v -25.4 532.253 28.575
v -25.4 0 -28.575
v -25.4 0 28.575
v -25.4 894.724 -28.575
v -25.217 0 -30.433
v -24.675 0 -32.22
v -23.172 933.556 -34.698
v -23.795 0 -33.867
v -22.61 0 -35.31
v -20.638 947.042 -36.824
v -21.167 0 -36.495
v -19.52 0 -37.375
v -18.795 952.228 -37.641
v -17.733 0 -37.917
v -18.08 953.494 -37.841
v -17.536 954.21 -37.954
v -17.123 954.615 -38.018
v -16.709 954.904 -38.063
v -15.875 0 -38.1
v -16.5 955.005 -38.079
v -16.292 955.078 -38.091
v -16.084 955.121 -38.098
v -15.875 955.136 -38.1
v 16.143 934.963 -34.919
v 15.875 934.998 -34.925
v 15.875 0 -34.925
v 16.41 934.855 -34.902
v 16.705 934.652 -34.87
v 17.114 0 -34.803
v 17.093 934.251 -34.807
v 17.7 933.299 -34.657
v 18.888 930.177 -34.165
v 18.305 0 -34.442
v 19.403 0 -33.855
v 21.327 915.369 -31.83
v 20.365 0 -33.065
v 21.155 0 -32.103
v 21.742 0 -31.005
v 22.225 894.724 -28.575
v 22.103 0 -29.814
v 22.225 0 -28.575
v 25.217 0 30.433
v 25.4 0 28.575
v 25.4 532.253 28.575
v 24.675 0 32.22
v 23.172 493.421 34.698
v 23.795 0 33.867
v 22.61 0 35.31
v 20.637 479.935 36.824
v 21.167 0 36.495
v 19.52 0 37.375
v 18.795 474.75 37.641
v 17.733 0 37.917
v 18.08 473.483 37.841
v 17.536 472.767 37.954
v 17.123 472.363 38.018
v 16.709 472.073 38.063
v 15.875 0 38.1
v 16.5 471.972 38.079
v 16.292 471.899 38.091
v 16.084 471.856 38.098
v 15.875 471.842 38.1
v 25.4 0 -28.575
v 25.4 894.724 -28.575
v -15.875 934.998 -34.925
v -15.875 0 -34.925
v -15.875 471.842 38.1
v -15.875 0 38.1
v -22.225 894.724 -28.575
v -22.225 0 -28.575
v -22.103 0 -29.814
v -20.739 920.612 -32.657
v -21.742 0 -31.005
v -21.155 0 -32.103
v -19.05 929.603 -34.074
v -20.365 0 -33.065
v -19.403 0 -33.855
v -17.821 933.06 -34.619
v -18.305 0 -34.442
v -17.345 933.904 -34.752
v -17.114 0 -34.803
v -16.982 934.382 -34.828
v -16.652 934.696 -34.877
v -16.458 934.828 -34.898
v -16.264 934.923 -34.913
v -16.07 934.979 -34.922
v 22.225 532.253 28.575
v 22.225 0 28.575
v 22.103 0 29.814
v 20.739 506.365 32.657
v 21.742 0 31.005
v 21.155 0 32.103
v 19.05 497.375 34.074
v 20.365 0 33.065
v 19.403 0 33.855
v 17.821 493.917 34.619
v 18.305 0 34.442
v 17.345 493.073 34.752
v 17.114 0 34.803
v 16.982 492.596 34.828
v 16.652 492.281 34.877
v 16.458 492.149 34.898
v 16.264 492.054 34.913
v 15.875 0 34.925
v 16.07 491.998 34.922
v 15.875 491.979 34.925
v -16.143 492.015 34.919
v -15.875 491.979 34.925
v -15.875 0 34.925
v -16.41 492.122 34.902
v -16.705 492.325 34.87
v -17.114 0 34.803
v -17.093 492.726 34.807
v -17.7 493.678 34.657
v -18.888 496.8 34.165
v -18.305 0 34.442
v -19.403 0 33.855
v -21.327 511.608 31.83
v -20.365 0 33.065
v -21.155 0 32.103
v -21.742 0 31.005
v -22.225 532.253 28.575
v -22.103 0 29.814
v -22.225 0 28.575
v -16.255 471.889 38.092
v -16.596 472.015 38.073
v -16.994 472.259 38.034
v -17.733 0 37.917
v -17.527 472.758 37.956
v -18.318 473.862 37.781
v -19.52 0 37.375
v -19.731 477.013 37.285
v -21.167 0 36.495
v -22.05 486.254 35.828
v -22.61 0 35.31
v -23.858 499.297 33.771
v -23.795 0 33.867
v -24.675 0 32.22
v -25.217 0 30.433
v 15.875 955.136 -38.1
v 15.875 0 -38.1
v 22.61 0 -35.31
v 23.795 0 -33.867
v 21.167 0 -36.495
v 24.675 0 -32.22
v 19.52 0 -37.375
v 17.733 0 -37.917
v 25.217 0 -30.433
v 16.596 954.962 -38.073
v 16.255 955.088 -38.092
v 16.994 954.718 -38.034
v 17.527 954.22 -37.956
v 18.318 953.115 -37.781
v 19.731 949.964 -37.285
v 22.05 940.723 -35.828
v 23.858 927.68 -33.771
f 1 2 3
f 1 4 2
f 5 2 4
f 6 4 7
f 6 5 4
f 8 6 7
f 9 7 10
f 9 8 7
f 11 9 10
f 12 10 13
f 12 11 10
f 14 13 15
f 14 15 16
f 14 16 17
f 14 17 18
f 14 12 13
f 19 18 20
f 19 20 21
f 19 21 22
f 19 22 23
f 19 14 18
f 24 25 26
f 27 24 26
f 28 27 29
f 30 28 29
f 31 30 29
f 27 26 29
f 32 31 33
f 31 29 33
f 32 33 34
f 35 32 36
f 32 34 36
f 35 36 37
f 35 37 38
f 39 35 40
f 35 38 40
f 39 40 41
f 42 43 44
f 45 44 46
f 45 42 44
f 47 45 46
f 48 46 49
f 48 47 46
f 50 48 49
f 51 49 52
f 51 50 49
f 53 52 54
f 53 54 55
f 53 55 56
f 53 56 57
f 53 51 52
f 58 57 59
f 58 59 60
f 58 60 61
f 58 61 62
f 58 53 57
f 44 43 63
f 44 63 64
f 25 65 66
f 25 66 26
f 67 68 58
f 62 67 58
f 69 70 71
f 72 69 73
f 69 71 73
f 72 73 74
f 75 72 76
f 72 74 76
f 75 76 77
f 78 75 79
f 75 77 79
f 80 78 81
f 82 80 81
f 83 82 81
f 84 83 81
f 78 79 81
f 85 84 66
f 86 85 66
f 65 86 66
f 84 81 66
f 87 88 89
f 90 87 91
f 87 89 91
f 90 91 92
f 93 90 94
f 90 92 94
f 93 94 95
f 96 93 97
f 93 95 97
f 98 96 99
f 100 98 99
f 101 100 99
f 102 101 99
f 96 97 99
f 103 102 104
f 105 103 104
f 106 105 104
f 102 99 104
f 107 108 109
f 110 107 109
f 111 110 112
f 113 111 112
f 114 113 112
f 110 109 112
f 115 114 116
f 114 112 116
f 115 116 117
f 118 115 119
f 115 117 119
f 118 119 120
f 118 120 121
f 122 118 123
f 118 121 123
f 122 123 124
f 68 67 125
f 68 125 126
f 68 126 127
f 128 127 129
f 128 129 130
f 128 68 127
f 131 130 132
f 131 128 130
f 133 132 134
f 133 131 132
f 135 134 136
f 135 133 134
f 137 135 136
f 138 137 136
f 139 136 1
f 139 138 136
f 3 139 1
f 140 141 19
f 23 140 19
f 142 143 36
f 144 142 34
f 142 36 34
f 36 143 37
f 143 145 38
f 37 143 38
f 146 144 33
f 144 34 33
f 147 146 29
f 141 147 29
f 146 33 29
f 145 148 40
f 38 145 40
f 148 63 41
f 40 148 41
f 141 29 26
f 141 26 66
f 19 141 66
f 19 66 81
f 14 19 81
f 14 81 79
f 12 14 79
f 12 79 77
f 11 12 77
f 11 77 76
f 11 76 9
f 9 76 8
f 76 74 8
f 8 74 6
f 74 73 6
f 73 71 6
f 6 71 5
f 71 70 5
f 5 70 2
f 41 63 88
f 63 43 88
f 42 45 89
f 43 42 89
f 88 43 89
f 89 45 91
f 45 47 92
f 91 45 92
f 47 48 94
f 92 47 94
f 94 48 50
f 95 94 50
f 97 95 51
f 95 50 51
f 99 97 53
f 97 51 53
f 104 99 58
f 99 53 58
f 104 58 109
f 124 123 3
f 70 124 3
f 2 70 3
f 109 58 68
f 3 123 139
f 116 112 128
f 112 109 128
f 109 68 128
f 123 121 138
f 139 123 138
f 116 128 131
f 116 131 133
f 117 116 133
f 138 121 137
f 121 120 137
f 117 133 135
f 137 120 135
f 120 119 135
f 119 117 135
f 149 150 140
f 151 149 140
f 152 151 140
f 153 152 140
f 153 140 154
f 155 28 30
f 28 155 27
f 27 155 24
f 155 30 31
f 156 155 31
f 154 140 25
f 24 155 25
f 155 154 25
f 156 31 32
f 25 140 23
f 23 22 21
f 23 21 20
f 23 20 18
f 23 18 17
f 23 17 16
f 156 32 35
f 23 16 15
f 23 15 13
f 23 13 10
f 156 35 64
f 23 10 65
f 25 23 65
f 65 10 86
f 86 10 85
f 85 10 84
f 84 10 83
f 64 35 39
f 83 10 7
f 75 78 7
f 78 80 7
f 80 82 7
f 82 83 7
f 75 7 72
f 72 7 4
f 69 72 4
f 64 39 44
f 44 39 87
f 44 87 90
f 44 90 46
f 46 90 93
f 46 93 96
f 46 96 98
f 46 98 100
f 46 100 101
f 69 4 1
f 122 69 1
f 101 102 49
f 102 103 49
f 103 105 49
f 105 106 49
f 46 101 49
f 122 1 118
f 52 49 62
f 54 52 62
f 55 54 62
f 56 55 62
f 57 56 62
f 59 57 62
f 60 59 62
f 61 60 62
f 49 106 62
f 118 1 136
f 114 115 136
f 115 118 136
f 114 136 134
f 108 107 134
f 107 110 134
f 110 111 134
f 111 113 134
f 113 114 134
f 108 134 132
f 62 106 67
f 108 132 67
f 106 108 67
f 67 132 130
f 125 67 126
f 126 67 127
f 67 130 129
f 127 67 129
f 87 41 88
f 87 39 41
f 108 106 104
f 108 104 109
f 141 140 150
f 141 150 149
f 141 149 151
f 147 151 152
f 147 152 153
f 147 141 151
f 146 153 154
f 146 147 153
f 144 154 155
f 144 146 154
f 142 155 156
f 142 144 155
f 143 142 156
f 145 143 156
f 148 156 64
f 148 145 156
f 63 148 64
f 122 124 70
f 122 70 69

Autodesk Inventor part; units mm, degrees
ref_plane "YZ Plane" through (0, 0, 0) normal (1, 0, 0) x (0, 1, 0)
ref_plane "XZ Plane" through (0, 0, 0) normal (0, 1, 0) x (-1, 0, 0)
ref_plane "XY Plane" through (0, 0, 0) normal (0, 0, 1) x (1, 0, 0)
sketch "Sketch1" plane through (0, 0, 0) normal (0, 1, 0) x (-1, 0, 0)
  line L0 (15.875, 38.1) -> (-15.875, 38.1)
  line L1 (-25.4, 28.575) -> (-25.4, -28.575)
  line L2 (-15.875, -38.1) -> (15.875, -38.1)
  line L3 (25.4, -28.575) -> (25.4, 28.575)
  line L4 (25.4, 38.1) -> (-25.4, -38.1) construction
  line L5 (-25.4, 38.1) -> (25.4, -38.1) construction
  arc A0 (15.875, -38.1) -> (25.4, -28.575) centre (15.875, -28.575) ccw
  arc A1 (25.4, 28.575) -> (15.875, 38.1) centre (15.875, 28.575) ccw
  arc A2 (-15.875, 38.1) -> (-25.4, 28.575) centre (-15.875, 28.575) ccw
  arc A3 (-25.4, -28.575) -> (-15.875, -38.1) centre (-15.875, -28.575) ccw
  line L6 (15.875, -34.925) -> (-15.875, -34.925)
  arc A4 (-22.225, -28.575) -> (-15.875, -34.925) centre (-15.875, -28.575) ccw
  line L7 (-22.225, -28.575) -> (-22.225, 28.575)
  arc A5 (-15.875, 34.925) -> (-22.225, 28.575) centre (-15.875, 28.575) ccw
  line L8 (-15.875, 34.925) -> (15.875, 34.925)
  arc A6 (22.225, 28.575) -> (15.875, 34.925) centre (15.875, 28.575) ccw
  line L9 (22.225, 28.575) -> (22.225, -28.575)
  arc A7 (15.875, -34.925) -> (22.225, -28.575) centre (15.875, -28.575) ccw
  point P0 (0, 0)
  dimension "d0" = 76.2
  dimension "d1" = 50.8
  dimension "d2" = 9.525
  dimension "d3" = 3.175
extrude "Extrusion1" add sketch "Sketch1" along normal blind 955.1356
sketch "Sketch2" plane through (-25.4, 0, -28.575) normal (-1, 0, 0) x (0, 0, 1)
  line L0 (0, 955.1356) -> (-9.525, 955.1356) projected
  line L1 (-9.525, 955.1356) -> (66.675, 471.8415)
  line L2 (66.675, 0) -> (66.675, 955.1356) projected
  line L3 (66.675, 471.8415) -> (66.675, 955.1356)
  line L4 (66.675, 955.1356) -> (-9.525, 955.1356)
  line L5 (-9.525, 0) -> (-9.525, 955.1356) projected
  point P0 (28.575, 0)
  dimension "d6" = 8.96
extrude "Extrusion2" cut sketch "Sketch2" against normal through all
equation "\"d0\" = stockWidth"
equation "\"d1\" = stockHeight"
equation "\"d2\" = stockRad"
equation "\"d3\" = stockGuage"
equation "\"d4\" = supVertLen"
equation "\"d6\" = sup2Ang"
equation "\"height\" = 203.2"
equation "\"shaftDiam\" = 6.35"
equation "\"shaftSpace\" = 1.5875"
equation "\"stageSpace\" = 2.54"
equation "\"stageAngle\" = 15deg"
equation "\"stockHeight\" = 50.8"
equation "\"stockWidth\" = 76.2"
equation "\"stockRad\" = 9.525"
equation "\"stockGuage\" = 3.175"
equation "\"groundActu\" = 304.8"
equation "\"baseWidth\" = 1066.8"
equation "\"baseDepth\" = 254"
equation "\"capThickness\" = 3.175"
equation "\"sup1Len\" = 660.4"
equation "\"sup1Ang\" = 22.619865deg"
equation "\"sup2Len\" = 2079.37366"
equation "\"sup2Ang\" = 8.95995deg"
equation "\"supVertLen\" = 955.13561"
equation "\"supSideAng\" = 19.376933deg"
equation "\"supSideLen\" = 1531.12879"
equation "\"FlangeDiam\" = 12.7"
equation "\"bearingDiam\" = 9.5504"
equation "\"FlangeDepth\" = 1.5875"
equation "\"smallFilet\" = 0.39687"
equation "\"thickness\" = 12.7"
equation "\"ringDiam\" = 96.46608"
properties part number "vert support" material "Aluminum 6061"
